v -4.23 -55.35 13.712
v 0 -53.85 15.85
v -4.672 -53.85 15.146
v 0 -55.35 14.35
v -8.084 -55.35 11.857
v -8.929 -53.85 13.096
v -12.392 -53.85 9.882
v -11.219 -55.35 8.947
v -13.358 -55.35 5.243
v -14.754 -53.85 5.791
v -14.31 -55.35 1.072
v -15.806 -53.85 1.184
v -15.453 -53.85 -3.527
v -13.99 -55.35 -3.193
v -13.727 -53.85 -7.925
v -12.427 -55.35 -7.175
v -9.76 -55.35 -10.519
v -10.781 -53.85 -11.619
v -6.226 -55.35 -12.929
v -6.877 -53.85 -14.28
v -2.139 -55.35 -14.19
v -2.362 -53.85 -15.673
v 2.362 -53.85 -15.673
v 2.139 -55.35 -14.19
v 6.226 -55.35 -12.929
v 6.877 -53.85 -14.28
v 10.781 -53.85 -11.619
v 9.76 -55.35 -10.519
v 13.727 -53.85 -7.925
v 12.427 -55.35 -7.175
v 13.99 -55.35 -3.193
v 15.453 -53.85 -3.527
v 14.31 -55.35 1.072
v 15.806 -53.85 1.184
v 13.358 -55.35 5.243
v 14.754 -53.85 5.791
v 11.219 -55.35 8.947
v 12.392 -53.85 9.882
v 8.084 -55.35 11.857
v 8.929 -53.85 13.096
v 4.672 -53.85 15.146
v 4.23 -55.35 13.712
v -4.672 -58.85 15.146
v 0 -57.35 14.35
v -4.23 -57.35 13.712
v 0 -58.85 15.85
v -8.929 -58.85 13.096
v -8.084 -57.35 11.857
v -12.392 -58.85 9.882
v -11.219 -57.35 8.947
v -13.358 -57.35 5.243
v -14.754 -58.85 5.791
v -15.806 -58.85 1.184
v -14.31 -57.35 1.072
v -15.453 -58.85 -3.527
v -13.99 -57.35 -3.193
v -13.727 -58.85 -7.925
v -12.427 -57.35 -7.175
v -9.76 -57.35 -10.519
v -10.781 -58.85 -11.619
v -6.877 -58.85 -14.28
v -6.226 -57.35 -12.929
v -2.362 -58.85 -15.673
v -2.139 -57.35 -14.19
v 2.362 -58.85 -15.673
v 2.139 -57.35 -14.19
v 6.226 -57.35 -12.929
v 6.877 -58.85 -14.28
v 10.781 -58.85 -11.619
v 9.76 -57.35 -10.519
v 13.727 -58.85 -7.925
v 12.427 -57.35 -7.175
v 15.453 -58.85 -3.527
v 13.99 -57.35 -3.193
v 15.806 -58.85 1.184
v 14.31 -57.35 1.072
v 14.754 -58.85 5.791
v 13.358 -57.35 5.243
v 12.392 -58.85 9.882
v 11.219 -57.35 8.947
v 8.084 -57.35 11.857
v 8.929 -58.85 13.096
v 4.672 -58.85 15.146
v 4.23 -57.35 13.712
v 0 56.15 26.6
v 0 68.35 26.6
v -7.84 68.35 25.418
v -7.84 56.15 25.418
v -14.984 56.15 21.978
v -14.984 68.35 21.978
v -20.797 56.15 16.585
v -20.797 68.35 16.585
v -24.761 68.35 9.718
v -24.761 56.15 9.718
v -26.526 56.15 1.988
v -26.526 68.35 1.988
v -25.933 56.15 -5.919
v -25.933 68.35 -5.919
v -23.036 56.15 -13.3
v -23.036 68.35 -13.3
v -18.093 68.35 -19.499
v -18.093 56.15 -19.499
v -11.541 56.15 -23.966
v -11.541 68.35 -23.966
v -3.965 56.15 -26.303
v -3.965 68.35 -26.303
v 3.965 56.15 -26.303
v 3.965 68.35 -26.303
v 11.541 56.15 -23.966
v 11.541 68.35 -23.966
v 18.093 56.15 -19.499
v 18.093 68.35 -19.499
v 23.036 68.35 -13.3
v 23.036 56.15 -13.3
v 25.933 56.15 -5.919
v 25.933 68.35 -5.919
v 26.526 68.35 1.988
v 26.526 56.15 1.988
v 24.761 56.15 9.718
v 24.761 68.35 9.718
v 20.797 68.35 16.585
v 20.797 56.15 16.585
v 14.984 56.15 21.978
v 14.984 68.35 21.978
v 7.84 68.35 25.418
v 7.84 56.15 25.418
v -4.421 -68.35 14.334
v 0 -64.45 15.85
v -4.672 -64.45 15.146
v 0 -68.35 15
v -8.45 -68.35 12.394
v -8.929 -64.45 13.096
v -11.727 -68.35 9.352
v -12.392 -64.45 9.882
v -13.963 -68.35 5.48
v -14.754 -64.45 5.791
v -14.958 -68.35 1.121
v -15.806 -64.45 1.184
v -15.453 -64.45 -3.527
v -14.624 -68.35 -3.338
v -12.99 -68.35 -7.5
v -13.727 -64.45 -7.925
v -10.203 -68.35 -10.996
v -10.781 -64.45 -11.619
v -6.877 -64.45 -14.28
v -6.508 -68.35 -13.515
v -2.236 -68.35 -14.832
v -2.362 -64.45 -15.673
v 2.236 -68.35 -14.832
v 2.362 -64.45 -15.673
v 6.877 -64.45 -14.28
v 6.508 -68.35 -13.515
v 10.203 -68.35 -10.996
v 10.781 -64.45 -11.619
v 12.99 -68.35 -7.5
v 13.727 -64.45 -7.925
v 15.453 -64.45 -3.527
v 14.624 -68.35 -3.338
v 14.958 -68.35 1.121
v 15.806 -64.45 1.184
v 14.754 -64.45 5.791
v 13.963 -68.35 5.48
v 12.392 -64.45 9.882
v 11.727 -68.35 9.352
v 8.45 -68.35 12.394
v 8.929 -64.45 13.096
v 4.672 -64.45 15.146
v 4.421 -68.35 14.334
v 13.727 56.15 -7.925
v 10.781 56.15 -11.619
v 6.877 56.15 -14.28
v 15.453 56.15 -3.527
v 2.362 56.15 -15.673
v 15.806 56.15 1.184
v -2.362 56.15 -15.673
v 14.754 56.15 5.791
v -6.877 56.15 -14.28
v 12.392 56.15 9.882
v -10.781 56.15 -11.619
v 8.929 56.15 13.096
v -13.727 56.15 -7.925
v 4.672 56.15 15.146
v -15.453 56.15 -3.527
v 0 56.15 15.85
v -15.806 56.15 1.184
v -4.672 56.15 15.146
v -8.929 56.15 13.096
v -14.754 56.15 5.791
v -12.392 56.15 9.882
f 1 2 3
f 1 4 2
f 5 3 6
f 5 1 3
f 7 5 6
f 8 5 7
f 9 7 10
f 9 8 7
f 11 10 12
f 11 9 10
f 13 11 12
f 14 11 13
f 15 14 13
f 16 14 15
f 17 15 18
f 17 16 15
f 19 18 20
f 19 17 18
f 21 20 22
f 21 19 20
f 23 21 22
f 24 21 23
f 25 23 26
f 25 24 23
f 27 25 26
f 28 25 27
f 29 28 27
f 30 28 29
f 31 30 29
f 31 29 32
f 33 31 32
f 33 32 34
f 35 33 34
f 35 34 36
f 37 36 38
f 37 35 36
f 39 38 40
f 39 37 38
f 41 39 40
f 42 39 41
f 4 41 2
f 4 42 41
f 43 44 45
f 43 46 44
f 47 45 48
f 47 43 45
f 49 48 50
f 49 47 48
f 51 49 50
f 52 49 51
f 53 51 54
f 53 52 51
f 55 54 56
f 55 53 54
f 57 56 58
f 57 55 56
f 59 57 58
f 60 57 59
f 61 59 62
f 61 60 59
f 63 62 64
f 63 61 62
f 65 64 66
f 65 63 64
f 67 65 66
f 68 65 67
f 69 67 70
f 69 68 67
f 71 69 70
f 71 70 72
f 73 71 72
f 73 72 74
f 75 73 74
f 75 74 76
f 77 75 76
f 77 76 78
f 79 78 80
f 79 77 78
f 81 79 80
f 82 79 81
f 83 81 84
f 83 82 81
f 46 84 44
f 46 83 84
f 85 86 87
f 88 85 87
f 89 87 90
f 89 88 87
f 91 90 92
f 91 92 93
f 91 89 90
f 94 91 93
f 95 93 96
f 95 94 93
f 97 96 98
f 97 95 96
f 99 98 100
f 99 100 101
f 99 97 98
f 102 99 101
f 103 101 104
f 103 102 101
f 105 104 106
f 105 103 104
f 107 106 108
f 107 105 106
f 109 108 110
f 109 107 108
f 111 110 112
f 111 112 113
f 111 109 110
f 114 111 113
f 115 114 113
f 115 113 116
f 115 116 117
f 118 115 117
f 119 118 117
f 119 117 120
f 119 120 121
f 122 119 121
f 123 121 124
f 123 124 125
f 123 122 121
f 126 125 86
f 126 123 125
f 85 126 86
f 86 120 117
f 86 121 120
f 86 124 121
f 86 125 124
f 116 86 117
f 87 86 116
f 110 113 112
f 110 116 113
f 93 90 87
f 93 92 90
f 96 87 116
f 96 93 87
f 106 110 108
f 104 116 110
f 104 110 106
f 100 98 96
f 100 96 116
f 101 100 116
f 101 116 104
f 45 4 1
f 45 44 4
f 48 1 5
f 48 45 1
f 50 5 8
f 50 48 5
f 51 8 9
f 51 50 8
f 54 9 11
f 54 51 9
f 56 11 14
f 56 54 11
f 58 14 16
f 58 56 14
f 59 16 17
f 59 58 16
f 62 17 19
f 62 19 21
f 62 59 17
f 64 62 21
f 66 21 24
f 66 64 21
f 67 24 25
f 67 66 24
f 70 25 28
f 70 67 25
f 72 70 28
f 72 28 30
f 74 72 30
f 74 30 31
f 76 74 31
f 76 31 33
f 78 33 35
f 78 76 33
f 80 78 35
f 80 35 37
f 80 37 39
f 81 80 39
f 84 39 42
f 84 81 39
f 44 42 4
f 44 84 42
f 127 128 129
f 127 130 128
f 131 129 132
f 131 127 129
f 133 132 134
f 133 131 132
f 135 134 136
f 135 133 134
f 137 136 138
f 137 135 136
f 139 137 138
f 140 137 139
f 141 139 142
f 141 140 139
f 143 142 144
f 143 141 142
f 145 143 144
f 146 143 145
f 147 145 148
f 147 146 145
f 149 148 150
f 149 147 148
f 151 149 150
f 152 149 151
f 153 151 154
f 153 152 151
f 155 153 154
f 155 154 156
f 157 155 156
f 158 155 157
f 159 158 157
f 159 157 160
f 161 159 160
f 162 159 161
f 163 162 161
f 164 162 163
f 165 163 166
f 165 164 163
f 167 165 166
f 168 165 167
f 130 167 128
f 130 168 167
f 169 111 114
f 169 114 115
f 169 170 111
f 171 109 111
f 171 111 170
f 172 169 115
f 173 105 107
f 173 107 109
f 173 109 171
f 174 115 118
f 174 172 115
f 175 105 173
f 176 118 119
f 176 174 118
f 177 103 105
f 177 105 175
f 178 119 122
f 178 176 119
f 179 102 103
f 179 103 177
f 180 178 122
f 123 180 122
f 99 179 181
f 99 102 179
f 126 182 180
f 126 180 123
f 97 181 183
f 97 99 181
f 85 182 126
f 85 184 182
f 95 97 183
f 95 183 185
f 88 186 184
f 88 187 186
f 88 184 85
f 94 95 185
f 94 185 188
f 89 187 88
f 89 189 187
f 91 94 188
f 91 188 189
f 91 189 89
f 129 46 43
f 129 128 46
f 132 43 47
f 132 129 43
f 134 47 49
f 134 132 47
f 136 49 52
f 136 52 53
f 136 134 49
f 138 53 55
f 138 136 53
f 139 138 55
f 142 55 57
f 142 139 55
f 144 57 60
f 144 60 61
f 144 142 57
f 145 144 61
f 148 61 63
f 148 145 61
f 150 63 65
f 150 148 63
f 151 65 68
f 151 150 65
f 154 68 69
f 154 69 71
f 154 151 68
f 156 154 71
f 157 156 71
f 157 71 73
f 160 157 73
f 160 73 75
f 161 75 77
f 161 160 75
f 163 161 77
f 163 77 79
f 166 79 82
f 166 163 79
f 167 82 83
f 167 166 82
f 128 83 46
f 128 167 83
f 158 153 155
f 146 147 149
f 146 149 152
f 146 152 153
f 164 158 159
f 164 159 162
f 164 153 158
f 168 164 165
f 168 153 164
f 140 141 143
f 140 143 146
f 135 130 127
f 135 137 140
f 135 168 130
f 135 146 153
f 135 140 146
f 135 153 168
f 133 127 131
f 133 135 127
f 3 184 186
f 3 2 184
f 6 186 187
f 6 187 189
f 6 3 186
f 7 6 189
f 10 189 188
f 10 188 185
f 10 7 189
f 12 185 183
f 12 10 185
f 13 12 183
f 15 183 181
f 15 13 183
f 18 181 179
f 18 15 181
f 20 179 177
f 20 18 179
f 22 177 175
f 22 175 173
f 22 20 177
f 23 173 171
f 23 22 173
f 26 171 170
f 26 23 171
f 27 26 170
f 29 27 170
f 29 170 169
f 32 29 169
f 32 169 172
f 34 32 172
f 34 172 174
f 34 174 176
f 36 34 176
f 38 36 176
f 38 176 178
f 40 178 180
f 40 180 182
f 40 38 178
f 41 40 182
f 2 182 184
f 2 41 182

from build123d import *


with BuildPart() as part:
    # Croquis1 → Revolución1 (revolve)
    with BuildSketch(Plane.XY, mode=Mode.PRIVATE) as revoluci_n1_sk:
        Polygon((0, 68.35), (26.6, 68.35), (26.6, 56.15), (15.85, 56.15), (15.85, -53.85), (14.35, -55.35), (14.35, -57.35), (15.85, -58.85), (15.85, -64.45), (15, -68.35), (0, -68.35), align=None)
    revolve(revoluci_n1_sk.sketch.rotate(Axis((0, 107.931381584, 0), (0, -1, 0)), 90), axis=Axis((0, 107.931381584, 0), (0, -1, 0)))


solid = part.part
